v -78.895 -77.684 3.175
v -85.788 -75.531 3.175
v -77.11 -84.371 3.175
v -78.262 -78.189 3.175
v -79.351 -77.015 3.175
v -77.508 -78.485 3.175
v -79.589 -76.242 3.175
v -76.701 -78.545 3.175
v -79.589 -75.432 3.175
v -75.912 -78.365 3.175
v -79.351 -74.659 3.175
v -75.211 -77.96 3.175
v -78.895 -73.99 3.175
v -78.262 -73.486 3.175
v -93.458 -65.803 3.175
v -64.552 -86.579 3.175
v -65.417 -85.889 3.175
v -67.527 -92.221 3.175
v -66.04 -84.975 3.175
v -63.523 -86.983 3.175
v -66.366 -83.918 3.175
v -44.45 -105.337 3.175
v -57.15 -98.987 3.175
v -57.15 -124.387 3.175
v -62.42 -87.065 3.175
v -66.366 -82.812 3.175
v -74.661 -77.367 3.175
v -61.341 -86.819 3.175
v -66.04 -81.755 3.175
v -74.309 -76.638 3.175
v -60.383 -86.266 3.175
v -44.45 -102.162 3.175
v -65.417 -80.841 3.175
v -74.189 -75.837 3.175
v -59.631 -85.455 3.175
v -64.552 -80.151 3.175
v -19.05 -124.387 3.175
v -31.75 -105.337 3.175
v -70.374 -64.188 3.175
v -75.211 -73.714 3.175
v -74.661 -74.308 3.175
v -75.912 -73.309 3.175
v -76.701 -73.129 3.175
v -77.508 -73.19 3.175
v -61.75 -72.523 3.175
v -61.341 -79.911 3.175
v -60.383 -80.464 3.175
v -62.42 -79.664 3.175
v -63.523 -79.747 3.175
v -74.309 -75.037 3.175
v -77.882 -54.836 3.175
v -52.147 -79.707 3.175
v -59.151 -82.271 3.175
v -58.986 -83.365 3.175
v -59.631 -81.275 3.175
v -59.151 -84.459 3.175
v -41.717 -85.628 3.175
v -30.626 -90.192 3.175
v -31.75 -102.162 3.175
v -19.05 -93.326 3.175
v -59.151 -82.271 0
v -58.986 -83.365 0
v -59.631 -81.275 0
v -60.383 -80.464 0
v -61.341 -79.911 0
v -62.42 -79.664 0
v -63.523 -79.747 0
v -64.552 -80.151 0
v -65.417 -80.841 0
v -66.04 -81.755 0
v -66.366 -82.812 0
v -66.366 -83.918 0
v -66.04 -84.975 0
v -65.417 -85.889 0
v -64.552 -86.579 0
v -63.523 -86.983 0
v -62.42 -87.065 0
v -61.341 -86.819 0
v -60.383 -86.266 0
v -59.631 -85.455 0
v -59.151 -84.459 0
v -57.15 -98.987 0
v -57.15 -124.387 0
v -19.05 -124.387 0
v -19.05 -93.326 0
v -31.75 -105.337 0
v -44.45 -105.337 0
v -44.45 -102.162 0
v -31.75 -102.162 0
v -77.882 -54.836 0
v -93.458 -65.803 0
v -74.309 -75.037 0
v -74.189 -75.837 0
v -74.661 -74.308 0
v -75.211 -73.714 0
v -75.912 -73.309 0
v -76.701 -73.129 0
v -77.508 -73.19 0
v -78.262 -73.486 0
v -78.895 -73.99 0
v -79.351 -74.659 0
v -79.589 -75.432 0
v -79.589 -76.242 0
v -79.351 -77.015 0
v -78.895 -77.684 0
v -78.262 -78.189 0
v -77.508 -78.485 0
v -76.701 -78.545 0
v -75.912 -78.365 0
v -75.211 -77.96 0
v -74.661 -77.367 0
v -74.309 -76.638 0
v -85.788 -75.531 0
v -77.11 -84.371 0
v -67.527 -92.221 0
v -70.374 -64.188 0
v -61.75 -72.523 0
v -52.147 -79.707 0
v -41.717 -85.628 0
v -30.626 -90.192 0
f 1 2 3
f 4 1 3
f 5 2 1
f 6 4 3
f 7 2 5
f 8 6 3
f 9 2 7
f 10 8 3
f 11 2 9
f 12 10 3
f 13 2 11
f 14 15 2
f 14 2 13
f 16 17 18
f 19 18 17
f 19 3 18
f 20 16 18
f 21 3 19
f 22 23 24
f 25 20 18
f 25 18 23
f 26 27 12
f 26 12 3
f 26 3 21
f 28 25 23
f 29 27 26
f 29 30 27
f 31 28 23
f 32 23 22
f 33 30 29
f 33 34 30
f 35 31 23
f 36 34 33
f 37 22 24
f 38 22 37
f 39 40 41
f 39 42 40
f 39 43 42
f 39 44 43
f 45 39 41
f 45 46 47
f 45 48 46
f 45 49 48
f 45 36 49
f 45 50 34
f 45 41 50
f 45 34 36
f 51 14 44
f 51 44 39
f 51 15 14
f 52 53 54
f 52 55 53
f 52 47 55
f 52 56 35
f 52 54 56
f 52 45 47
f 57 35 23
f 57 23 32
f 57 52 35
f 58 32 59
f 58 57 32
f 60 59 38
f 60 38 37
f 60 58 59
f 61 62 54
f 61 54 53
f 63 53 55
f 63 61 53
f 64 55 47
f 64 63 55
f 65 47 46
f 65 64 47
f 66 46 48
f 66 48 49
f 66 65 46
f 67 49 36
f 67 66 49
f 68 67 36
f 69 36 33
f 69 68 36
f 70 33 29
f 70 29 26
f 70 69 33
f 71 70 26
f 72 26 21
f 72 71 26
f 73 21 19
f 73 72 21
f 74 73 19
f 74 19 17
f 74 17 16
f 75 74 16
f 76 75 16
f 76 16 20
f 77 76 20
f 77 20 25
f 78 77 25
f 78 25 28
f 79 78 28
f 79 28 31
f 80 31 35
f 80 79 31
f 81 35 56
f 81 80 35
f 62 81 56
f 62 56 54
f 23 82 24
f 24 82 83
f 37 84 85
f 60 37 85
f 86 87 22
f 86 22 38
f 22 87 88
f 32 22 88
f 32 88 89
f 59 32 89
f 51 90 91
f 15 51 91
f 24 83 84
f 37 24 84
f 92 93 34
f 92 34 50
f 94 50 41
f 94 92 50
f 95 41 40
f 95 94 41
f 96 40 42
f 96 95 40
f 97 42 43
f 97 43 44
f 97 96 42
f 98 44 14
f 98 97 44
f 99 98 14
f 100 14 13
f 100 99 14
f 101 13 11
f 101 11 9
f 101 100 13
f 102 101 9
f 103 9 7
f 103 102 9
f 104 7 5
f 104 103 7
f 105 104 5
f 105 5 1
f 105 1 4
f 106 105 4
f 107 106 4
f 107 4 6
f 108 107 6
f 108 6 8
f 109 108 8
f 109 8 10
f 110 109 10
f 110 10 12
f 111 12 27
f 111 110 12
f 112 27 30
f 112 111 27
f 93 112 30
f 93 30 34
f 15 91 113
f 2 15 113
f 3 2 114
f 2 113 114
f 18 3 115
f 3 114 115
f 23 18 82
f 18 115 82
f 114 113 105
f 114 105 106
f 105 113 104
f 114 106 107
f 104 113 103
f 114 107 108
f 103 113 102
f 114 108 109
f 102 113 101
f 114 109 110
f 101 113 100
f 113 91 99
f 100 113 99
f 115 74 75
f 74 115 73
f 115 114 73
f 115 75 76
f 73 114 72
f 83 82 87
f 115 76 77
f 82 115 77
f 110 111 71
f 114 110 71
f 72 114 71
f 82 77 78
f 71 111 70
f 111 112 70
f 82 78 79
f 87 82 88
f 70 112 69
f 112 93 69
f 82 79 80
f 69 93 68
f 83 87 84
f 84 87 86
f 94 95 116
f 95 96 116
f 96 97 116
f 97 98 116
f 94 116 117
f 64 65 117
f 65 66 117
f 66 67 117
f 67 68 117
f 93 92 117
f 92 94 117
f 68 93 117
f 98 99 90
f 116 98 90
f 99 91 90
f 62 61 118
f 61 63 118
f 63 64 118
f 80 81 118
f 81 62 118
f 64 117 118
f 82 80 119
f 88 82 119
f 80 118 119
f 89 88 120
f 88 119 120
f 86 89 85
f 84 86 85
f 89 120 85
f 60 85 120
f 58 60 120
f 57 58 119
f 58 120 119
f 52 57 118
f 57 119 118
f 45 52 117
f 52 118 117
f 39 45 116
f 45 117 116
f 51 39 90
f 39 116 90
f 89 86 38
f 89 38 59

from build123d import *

# Parameters (mm, degrees)
SKETCH1_R           = 2.71553392
SKETCH1_R_2         = 3.710832544
SKETCH1_W           = 12.7
SKETCH1_H           = 3.175
BOSS_EXTRUDE1_DEPTH = 3.175


with BuildPart() as part:
    # Sketch1 → Boss-Extrude1 (new body)
    with BuildSketch(Plane.XY):
        with BuildLine():
            Line((-19.05, -124.386703653), (-19.05, -93.3255592))
            ThreePointArc((-19.05, -93.3255592), (-52.146864666, -79.707383632), (-77.881676461, -54.836183051))
            Line((-77.881676461, -54.836183051), (-93.458011754, -65.803419661))
            ThreePointArc((-93.458011754, -65.803419661), (-77.110154229, -84.371287265), (-57.15, -98.986703653))
            Line((-57.15, -98.986703653), (-57.15, -124.386703653))
            Line((-57.15, -124.386703653), (-19.05, -124.386703653))
        make_face()
        with Locations((-76.904233533, -75.837226531)):
            Circle(SKETCH1_R, mode=Mode.SUBTRACT)
        with Locations((-62.697046078, -83.364915406)):
            Circle(SKETCH1_R_2, mode=Mode.SUBTRACT)
        with Locations((-38.1, -103.749203653)):
            Rectangle(SKETCH1_W, SKETCH1_H, mode=Mode.SUBTRACT)
    extrude(amount=BOSS_EXTRUDE1_DEPTH)


solid = part.part
